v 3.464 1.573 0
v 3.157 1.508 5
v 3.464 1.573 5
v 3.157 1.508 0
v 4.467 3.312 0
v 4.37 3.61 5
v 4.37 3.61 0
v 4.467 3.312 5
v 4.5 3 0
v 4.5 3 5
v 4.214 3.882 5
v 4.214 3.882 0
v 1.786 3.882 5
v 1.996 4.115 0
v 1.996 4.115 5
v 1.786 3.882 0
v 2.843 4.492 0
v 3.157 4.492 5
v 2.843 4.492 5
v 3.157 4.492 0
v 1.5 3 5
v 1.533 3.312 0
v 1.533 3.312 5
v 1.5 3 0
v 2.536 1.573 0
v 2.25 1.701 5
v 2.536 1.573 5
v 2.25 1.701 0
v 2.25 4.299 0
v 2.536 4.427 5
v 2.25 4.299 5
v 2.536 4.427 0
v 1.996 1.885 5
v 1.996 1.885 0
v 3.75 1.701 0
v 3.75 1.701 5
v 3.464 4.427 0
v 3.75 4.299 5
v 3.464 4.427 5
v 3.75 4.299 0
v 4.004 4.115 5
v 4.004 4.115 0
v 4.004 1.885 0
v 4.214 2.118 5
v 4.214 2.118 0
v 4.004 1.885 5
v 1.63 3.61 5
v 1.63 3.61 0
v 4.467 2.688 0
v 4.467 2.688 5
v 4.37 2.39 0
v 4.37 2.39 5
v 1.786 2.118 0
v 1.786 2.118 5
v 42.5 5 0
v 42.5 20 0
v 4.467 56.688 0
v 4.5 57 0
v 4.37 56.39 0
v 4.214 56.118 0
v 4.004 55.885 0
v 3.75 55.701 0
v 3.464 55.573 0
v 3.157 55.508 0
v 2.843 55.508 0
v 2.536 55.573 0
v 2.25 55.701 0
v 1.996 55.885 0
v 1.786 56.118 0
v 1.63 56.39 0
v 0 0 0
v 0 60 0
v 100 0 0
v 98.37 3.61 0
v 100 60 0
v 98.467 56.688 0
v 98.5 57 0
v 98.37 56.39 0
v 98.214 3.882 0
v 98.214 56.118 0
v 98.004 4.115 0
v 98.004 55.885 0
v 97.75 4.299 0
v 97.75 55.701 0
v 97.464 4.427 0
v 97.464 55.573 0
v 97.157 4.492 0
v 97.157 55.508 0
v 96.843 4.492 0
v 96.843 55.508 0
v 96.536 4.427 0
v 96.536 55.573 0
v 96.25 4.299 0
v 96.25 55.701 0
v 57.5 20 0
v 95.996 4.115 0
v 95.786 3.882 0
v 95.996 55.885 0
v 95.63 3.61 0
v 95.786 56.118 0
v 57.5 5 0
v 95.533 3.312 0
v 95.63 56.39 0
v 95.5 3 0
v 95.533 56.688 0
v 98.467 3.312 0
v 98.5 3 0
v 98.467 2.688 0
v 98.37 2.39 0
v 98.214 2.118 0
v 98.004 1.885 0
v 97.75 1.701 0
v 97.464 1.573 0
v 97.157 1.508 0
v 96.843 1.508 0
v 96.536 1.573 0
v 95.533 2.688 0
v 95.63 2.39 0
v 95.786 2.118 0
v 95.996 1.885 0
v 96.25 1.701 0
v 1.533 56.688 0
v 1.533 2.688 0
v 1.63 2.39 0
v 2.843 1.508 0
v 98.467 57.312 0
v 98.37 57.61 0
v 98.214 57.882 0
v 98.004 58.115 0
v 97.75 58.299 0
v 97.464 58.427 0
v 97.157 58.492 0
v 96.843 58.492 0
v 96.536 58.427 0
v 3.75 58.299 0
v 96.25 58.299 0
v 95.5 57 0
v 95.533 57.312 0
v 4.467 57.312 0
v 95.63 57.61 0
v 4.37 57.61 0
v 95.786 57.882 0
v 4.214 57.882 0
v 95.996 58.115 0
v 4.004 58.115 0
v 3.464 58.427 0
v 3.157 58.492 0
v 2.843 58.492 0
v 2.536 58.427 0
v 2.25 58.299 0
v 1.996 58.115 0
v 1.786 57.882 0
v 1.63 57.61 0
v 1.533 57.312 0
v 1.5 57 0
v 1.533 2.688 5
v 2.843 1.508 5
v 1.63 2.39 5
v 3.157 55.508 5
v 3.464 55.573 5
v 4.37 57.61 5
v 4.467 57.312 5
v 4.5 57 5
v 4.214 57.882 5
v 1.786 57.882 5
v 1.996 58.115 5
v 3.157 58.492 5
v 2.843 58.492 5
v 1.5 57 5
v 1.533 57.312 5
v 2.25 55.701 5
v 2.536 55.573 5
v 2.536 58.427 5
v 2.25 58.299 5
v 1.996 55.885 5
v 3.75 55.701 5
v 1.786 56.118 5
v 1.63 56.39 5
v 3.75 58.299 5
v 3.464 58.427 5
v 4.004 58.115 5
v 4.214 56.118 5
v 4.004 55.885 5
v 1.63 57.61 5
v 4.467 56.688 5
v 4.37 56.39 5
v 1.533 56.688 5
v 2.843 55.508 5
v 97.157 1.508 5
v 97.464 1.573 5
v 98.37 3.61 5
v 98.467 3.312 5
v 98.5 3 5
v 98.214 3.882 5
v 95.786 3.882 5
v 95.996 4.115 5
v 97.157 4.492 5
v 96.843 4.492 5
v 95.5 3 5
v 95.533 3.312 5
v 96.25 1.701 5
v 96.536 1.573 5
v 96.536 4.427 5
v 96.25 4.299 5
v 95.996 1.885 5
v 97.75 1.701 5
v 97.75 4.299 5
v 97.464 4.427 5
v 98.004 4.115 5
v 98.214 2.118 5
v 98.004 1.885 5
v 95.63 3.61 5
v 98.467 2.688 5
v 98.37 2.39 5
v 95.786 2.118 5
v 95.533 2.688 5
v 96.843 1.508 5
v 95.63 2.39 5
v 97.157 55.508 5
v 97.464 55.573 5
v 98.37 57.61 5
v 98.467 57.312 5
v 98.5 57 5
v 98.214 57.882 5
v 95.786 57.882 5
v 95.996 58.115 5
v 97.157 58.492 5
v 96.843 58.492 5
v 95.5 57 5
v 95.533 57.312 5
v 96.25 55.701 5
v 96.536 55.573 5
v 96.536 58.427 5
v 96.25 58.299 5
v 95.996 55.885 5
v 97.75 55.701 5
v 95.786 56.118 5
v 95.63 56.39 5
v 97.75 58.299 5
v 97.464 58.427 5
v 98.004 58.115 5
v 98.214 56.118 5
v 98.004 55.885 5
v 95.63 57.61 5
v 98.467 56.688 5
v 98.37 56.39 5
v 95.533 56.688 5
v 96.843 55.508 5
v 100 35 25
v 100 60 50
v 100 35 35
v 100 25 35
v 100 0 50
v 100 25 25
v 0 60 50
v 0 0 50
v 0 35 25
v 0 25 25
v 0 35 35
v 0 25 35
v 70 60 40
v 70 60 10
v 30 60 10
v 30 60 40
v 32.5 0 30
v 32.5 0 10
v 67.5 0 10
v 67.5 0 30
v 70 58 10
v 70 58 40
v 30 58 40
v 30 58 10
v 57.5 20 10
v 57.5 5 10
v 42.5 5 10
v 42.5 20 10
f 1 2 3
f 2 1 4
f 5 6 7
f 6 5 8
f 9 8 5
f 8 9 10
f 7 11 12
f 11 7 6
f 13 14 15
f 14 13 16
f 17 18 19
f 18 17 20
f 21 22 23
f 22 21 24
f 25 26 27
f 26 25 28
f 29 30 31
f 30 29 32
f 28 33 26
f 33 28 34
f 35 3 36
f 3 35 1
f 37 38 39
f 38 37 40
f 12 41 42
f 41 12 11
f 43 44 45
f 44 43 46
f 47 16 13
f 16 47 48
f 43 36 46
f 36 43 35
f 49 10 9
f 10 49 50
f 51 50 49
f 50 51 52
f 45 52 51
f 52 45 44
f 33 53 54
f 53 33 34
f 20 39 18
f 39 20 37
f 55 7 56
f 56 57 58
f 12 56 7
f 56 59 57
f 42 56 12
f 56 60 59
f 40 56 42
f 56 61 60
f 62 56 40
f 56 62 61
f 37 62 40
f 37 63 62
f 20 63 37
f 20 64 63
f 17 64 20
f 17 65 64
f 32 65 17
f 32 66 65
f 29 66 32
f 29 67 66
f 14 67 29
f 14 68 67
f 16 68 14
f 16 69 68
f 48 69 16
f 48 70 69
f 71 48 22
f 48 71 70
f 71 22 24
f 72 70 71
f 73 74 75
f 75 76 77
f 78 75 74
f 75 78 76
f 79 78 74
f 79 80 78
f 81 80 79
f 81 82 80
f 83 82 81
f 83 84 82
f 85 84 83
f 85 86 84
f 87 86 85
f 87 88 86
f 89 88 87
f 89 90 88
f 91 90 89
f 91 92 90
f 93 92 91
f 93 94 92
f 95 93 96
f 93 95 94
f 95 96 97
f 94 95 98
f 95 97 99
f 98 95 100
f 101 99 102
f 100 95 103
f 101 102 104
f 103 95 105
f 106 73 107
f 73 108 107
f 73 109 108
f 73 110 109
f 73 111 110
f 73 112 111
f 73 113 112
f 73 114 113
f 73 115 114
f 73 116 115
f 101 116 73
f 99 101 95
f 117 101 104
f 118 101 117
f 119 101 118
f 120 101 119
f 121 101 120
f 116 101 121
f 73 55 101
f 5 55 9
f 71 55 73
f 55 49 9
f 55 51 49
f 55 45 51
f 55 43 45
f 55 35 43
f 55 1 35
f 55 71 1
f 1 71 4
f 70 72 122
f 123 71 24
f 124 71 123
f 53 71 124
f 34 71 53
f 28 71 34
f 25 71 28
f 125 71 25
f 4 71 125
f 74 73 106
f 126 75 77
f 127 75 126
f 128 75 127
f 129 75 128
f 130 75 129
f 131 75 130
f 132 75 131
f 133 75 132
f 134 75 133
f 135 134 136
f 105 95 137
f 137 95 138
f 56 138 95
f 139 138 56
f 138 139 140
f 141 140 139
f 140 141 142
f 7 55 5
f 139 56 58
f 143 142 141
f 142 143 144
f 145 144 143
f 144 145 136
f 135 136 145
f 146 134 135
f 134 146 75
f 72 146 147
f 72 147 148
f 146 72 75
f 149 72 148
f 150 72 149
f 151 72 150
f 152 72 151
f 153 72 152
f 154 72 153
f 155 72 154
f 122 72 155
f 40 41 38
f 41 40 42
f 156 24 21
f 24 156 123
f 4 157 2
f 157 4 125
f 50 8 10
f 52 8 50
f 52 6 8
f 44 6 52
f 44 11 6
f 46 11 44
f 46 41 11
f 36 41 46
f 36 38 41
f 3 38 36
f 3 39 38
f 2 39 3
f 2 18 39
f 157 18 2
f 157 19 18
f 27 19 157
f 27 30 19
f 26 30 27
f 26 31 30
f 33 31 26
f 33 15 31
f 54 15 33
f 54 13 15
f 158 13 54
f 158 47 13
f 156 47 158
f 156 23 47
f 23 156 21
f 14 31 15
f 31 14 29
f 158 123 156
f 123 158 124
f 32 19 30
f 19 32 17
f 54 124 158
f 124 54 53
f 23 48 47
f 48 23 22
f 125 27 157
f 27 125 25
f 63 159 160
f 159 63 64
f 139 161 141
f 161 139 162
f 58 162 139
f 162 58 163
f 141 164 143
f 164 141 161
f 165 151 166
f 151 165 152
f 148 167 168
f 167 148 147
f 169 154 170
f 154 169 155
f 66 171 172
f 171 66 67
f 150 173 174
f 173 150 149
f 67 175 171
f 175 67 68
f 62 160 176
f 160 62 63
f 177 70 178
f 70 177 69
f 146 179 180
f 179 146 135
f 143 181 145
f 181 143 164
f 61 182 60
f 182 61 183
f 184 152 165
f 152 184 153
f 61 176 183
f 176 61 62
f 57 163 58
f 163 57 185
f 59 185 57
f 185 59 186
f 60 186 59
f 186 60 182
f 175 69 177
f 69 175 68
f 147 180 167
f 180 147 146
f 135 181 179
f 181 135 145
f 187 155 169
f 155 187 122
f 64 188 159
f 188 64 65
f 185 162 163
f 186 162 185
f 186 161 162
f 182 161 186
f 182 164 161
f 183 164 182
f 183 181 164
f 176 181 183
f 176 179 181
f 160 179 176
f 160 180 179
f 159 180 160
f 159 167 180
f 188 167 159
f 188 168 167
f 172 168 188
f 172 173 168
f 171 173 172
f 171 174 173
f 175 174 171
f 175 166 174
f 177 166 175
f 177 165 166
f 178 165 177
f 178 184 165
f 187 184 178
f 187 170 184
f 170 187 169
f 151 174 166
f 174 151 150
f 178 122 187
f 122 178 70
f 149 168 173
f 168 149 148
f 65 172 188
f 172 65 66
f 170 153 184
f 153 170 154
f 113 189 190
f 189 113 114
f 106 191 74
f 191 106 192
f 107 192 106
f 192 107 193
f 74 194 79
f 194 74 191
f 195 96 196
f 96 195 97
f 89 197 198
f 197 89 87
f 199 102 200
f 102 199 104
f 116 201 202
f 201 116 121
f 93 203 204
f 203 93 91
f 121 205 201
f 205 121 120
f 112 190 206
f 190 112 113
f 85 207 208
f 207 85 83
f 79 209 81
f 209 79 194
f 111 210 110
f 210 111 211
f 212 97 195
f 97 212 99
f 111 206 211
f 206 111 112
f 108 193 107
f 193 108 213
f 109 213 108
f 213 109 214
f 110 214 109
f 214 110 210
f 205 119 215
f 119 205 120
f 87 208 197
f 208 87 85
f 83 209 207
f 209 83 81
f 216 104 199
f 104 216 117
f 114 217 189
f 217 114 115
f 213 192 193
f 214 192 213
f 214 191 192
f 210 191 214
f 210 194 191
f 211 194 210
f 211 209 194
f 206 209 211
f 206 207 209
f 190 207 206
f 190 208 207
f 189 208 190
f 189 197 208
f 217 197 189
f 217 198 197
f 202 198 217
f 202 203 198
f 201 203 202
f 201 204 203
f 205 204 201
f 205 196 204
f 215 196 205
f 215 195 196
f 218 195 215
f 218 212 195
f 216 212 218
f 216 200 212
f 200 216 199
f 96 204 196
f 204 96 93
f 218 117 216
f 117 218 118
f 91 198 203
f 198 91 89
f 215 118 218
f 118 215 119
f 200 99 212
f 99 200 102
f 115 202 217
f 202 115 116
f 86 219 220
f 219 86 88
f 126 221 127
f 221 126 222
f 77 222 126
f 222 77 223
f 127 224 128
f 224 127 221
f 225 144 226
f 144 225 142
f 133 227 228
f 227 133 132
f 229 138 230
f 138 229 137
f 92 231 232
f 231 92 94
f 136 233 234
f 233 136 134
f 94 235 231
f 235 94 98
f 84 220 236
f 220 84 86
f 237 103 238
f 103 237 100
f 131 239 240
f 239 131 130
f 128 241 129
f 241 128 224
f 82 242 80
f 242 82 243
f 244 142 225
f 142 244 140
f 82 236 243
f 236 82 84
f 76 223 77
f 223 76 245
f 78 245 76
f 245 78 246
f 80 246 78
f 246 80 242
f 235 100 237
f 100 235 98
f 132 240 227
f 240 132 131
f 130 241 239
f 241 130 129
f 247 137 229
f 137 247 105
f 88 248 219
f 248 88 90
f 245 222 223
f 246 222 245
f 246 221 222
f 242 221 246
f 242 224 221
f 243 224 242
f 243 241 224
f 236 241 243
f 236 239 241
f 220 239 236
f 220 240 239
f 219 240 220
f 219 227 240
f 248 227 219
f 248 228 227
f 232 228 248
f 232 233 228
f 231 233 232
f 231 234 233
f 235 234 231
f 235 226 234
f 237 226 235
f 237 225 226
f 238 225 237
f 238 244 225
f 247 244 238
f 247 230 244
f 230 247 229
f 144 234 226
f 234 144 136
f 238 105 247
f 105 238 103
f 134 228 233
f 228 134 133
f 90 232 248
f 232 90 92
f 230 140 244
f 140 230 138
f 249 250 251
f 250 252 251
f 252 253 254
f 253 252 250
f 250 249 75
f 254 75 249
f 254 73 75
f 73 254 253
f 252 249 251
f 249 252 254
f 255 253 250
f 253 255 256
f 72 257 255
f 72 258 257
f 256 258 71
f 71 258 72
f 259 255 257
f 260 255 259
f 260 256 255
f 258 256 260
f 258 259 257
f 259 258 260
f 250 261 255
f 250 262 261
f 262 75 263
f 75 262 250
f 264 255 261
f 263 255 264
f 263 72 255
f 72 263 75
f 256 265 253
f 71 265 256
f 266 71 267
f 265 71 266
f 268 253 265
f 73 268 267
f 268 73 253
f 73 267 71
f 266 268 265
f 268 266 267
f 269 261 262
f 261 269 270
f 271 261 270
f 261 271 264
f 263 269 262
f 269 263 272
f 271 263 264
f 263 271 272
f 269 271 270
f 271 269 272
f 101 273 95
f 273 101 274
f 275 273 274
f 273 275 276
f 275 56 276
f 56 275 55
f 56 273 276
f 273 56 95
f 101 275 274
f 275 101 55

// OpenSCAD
// WALL·E Style Desktop Robot Shell (OpenSCAD)
// Dimensions: 100 x 60 x 50 mm body
// With slots for: ESP32, TFT, Speaker, Mic, Servo arms

module robot_shell() {
    difference() {
        // Outer shell
        cube([100, 60, 50], center = false);

        // TFT display cutout (front)
        translate([30, 58, 10])
            cube([40, 3, 30]);

        // ESP32 slot (rear)
        translate([32.5, -3, 10])
            cube([35, 3, 20]);

        // Speaker cutout (front center low)
        translate([42.5, 5, 0])
            cube([15, 15, 10]);

        // Left arm servo mount
        translate([-10, 25, 25])
            cube([10, 10, 10]);

        // Right arm servo mount
        translate([100, 25, 25])
            cube([10, 10, 10]);

        // Screw holes (corners)
        for (x=[3, 97]) for (y=[3, 57])
            translate([x, y, 0])
                cylinder(h=5, r=1.5, $fn=30);
    }
}

robot_shell();
